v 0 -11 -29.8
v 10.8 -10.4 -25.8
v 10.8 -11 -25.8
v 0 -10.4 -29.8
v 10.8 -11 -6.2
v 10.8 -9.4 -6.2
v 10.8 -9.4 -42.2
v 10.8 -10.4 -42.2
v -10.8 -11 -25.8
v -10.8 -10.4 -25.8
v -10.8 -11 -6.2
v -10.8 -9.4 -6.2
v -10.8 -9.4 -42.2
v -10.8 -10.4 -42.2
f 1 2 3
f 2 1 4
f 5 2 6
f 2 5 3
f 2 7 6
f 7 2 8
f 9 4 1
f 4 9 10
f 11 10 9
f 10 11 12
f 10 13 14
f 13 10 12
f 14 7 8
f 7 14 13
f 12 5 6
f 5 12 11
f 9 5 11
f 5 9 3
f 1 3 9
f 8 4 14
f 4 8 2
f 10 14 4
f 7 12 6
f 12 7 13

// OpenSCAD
// file: ../p/rect3.scad
use <../lib.scad>
function ldraw_lib__rect3() = [
// 0 Rectangle with 3 Edges
// 0 Name: rect3.dat
// 0 Author: Mark Kennedy [mkennedy]
// 0 !LDRAW_ORG Primitive UPDATE 2010-01
// 0 !LICENSE Licensed under CC BY 4.0 : see CAreadme.txt
// 
// 0 BFC CERTIFY CCW
  [0,"BFC","CERTIFY"],
  [0,"BFC","CCW"],
// 
// 0 !HISTORY 2003-08-01 [PTadmin] Official Update 2003-02
// 0 !HISTORY 2007-06-24 [PTadmin] Header formatted for Contributor Agreement
// 0 !HISTORY 2008-07-01 [PTadmin] Official Update 2008-01
// 0 !HISTORY 2010-01-17 [mikeheide] Change winding to CCW
// 0 !HISTORY 2010-04-05 [PTadmin] Official Update 2010-01
// 
// 
// 2 24 1 0 1 -1 0 1
  [2,24,1,0,1,-1,0,1],
// 2 24 1 0 1 1 0 -1
  [2,24,1,0,1,1,0,-1],
// 2 24 -1 0 1 -1 0 -1
  [2,24,-1,0,1,-1,0,-1],
// 4 16 -1 0 1 -1 0 -1 1 0 -1 1 0 1
  [4,16,-1,0,1,-1,0,-1,1,0,-1,1,0,1],
// 0 //
];
module ldraw_lib__rect3(step=0, col=false, unit=2/5, alt=false, line=0.2, solid=!$preview)
    makepoly(ldraw_lib__rect3(), step=step, col=col, unit=unit, alt=alt, line=line, solid=solid);
ldraw_lib__rect3(line=0.2);
// file: ../p/rect2p.scad
use <../lib.scad>
function ldraw_lib__rect2p() = [
// 0 Rectangle with 2 Parallel Edges
// 0 Name: rect2p.dat
// 0 Author: Donald Sutter [technog]
// 0 !LDRAW_ORG Primitive UPDATE 2010-01
// 0 !LICENSE Licensed under CC BY 4.0 : see CAreadme.txt
// 
// 0 BFC CERTIFY CCW
  [0,"BFC","CERTIFY"],
  [0,"BFC","CCW"],
// 
// 0 !HISTORY 2003-08-01 [PTadmin] Official Update 2003-02
// 0 !HISTORY 2007-06-24 [PTadmin] Header formatted for Contributor Agreement
// 0 !HISTORY 2008-07-01 [PTadmin] Official Update 2008-01
// 0 !HISTORY 2010-01-17 [mikeheide] changed winding to CCW
// 0 !HISTORY 2010-04-05 [PTadmin] Official Update 2010-01
// 
// 
// 2 24 1 0 1 -1 0 1
  [2,24,1,0,1,-1,0,1],
// 2 24 -1 0 -1 1 0 -1
  [2,24,-1,0,-1,1,0,-1],
// 4 16 -1 0 1 -1 0 -1 1 0 -1 1 0 1
  [4,16,-1,0,1,-1,0,-1,1,0,-1,1,0,1],
// 0
];
module ldraw_lib__rect2p(step=0, col=false, unit=2/5, alt=false, line=0.2, solid=!$preview)
    makepoly(ldraw_lib__rect2p(), step=step, col=col, unit=unit, alt=alt, line=line, solid=solid);
ldraw_lib__rect2p(line=0.2);
// file: ../p/rect.scad
use <../lib.scad>
function ldraw_lib__rect() = [
// 0 Rectangle
// 0 Name: rect.dat
// 0 Author: James Jessiman
// 0 !LDRAW_ORG Primitive UPDATE 2010-01
// 0 !LICENSE Licensed under CC BY 4.0 : see CAreadme.txt
// 
// 0 BFC CERTIFY CCW
  [0,"BFC","CERTIFY"],
  [0,"BFC","CCW"],
// 
// 0 !HISTORY 2002-04-05 [hafhead] Added BFC statement
// 0 !HISTORY 2002-04-25 [PTadmin] Official Update 2002-02
// 0 !HISTORY 2007-06-24 [PTadmin] Header formatted for Contributor Agreement
// 0 !HISTORY 2008-07-01 [PTadmin] Official Update 2008-01
// 0 !HISTORY 2010-01-17 [mikeheide] changed winding to CCW
// 0 !HISTORY 2010-04-05 [PTadmin] Official Update 2010-01
// 
// 
// 2 24 1 0 1 -1 0 1
  [2,24,1,0,1,-1,0,1],
// 2 24 -1 0 1 -1 0 -1
  [2,24,-1,0,1,-1,0,-1],
// 2 24 -1 0 -1 1 0 -1
  [2,24,-1,0,-1,1,0,-1],
// 2 24 1 0 -1 1 0 1
  [2,24,1,0,-1,1,0,1],
// 4 16 -1 0 1 -1 0 -1 1 0 -1 1 0 1
  [4,16,-1,0,1,-1,0,-1,1,0,-1,1,0,1],
// 0
];
module ldraw_lib__rect(step=0, col=false, unit=2/5, alt=false, line=0.2, solid=!$preview)
    makepoly(ldraw_lib__rect(), step=step, col=col, unit=unit, alt=alt, line=line, solid=solid);
ldraw_lib__rect(line=0.2);
// main file
use <../lib.scad>
use <../p/rect.scad>
use <../p/rect2p.scad>
use <../p/rect3.scad>
function ldraw_lib__u9116() = [
// 0 ~Electric Hub Mario Screen Glass
// 0 Name: u9116.dat
// 0 Author: Philippe Hurbain [Philo]
// 0 !LDRAW_ORG Part UPDATE 2023-06
// 0 !LICENSE Licensed under CC BY 4.0 : see CAreadme.txt
// 
// 0 BFC CERTIFY CCW
  [0,"BFC","CERTIFY"],
  [0,"BFC","CCW"],
// 
// 0 !HISTORY 2022-06-01 {LEGO Instructions App} Original part shape
// 0 !HISTORY 2022-06-12 [Philo] File preparation for LDraw Parts Tracker
// 0 !HISTORY 2023-11-19 [OrionP] Official Update 2023-06
// 
// 
// 0 // Needs Work: Clean necessary
// 
// 2 24 27 105.5 -26 27 64.5 -26
  [2,24,27,105.5,-26,27,64.5,-26],
// 1 16 13.5 69.5 -26.75 13.5 0 0 -5 -1 0 0 0 -0.75 rect.dat
  [1,16,13.5,69.5,-26.75,13.5,0,0,-5,-1,0,0,0,-0.75, ldraw_lib__rect()],
// 4 16 27 15.5 -23.5 27 15.5 -27.5 27 64.5 -27.5 27 64.5 -26
  [4,16,27,15.5,-23.5,27,15.5,-27.5,27,64.5,-27.5,27,64.5,-26],
// 4 16 27 15.5 -23.5 27 64.5 -26 27 105.5 -26 27 105.5 -23.5
  [4,16,27,15.5,-23.5,27,64.5,-26,27,105.5,-26,27,105.5,-23.5],
// 2 24 -27 105.5 -26 -27 64.5 -26
  [2,24,-27,105.5,-26,-27,64.5,-26],
// 1 16 -13.5 69.5 -26.75 0 0 -13.5 0 -1 -5 -0.75 0 0 rect3.dat
  [1,16,-13.5,69.5,-26.75,0,0,-13.5,0,-1,-5,-0.75,0,0, ldraw_lib__rect3()],
// 4 16 -27 64.5 -27.5 -27 15.5 -27.5 -27 15.5 -23.5 -27 64.5 -26
  [4,16,-27,64.5,-27.5,-27,15.5,-27.5,-27,15.5,-23.5,-27,64.5,-26],
// 4 16 -27 105.5 -26 -27 64.5 -26 -27 15.5 -23.5 -27 105.5 -23.5
  [4,16,-27,105.5,-26,-27,64.5,-26,-27,15.5,-23.5,-27,105.5,-23.5],
// 1 16 0 105.5 -24.75 27 0 0 0 -1 0 0 0 -1.25 rect.dat
  [1,16,0,105.5,-24.75,27,0,0,0,-1,0,0,0,-1.25, ldraw_lib__rect()],
// 1 16 0 15.5 -25.5 0 0 -27 0 1 0 2 0 0 rect.dat
  [1,16,0,15.5,-25.5,0,0,-27,0,1,0,2,0,0, ldraw_lib__rect()],
// 1 16 0 40 -27.5 0 0 27 24.5 0 0 0 1 0 rect2p.dat
  [1,16,0,40,-27.5,0,0,27,24.5,0,0,0,1,0, ldraw_lib__rect2p()],
// 3 16 0 74.5 -27.5 27 64.5 -27.5 -27 64.5 -27.5
  [3,16,0,74.5,-27.5,27,64.5,-27.5,-27,64.5,-27.5],
// 4 16 0 74.5 -26 -27 105.5 -26 27 105.5 -26 27 64.5 -26
  [4,16,0,74.5,-26,-27,105.5,-26,27,105.5,-26,27,64.5,-26],
// 3 16 -27 64.5 -26 -27 105.5 -26 0 74.5 -26
  [3,16,-27,64.5,-26,-27,105.5,-26,0,74.5,-26],
// 1 16 0 60.5 -23.5 0 0 27 -45 0 0 0 -1 0 rect2p.dat
  [1,16,0,60.5,-23.5,0,0,27,-45,0,0,0,-1,0, ldraw_lib__rect2p()],
];
module ldraw_lib__u9116(step=0, col=false, unit=2/5, alt=false, line=0.2, solid=!$preview)
    makepoly(ldraw_lib__u9116(), step=step, col=col, unit=unit, alt=alt, line=line, solid=solid);
ldraw_lib__u9116(line=0.2);
